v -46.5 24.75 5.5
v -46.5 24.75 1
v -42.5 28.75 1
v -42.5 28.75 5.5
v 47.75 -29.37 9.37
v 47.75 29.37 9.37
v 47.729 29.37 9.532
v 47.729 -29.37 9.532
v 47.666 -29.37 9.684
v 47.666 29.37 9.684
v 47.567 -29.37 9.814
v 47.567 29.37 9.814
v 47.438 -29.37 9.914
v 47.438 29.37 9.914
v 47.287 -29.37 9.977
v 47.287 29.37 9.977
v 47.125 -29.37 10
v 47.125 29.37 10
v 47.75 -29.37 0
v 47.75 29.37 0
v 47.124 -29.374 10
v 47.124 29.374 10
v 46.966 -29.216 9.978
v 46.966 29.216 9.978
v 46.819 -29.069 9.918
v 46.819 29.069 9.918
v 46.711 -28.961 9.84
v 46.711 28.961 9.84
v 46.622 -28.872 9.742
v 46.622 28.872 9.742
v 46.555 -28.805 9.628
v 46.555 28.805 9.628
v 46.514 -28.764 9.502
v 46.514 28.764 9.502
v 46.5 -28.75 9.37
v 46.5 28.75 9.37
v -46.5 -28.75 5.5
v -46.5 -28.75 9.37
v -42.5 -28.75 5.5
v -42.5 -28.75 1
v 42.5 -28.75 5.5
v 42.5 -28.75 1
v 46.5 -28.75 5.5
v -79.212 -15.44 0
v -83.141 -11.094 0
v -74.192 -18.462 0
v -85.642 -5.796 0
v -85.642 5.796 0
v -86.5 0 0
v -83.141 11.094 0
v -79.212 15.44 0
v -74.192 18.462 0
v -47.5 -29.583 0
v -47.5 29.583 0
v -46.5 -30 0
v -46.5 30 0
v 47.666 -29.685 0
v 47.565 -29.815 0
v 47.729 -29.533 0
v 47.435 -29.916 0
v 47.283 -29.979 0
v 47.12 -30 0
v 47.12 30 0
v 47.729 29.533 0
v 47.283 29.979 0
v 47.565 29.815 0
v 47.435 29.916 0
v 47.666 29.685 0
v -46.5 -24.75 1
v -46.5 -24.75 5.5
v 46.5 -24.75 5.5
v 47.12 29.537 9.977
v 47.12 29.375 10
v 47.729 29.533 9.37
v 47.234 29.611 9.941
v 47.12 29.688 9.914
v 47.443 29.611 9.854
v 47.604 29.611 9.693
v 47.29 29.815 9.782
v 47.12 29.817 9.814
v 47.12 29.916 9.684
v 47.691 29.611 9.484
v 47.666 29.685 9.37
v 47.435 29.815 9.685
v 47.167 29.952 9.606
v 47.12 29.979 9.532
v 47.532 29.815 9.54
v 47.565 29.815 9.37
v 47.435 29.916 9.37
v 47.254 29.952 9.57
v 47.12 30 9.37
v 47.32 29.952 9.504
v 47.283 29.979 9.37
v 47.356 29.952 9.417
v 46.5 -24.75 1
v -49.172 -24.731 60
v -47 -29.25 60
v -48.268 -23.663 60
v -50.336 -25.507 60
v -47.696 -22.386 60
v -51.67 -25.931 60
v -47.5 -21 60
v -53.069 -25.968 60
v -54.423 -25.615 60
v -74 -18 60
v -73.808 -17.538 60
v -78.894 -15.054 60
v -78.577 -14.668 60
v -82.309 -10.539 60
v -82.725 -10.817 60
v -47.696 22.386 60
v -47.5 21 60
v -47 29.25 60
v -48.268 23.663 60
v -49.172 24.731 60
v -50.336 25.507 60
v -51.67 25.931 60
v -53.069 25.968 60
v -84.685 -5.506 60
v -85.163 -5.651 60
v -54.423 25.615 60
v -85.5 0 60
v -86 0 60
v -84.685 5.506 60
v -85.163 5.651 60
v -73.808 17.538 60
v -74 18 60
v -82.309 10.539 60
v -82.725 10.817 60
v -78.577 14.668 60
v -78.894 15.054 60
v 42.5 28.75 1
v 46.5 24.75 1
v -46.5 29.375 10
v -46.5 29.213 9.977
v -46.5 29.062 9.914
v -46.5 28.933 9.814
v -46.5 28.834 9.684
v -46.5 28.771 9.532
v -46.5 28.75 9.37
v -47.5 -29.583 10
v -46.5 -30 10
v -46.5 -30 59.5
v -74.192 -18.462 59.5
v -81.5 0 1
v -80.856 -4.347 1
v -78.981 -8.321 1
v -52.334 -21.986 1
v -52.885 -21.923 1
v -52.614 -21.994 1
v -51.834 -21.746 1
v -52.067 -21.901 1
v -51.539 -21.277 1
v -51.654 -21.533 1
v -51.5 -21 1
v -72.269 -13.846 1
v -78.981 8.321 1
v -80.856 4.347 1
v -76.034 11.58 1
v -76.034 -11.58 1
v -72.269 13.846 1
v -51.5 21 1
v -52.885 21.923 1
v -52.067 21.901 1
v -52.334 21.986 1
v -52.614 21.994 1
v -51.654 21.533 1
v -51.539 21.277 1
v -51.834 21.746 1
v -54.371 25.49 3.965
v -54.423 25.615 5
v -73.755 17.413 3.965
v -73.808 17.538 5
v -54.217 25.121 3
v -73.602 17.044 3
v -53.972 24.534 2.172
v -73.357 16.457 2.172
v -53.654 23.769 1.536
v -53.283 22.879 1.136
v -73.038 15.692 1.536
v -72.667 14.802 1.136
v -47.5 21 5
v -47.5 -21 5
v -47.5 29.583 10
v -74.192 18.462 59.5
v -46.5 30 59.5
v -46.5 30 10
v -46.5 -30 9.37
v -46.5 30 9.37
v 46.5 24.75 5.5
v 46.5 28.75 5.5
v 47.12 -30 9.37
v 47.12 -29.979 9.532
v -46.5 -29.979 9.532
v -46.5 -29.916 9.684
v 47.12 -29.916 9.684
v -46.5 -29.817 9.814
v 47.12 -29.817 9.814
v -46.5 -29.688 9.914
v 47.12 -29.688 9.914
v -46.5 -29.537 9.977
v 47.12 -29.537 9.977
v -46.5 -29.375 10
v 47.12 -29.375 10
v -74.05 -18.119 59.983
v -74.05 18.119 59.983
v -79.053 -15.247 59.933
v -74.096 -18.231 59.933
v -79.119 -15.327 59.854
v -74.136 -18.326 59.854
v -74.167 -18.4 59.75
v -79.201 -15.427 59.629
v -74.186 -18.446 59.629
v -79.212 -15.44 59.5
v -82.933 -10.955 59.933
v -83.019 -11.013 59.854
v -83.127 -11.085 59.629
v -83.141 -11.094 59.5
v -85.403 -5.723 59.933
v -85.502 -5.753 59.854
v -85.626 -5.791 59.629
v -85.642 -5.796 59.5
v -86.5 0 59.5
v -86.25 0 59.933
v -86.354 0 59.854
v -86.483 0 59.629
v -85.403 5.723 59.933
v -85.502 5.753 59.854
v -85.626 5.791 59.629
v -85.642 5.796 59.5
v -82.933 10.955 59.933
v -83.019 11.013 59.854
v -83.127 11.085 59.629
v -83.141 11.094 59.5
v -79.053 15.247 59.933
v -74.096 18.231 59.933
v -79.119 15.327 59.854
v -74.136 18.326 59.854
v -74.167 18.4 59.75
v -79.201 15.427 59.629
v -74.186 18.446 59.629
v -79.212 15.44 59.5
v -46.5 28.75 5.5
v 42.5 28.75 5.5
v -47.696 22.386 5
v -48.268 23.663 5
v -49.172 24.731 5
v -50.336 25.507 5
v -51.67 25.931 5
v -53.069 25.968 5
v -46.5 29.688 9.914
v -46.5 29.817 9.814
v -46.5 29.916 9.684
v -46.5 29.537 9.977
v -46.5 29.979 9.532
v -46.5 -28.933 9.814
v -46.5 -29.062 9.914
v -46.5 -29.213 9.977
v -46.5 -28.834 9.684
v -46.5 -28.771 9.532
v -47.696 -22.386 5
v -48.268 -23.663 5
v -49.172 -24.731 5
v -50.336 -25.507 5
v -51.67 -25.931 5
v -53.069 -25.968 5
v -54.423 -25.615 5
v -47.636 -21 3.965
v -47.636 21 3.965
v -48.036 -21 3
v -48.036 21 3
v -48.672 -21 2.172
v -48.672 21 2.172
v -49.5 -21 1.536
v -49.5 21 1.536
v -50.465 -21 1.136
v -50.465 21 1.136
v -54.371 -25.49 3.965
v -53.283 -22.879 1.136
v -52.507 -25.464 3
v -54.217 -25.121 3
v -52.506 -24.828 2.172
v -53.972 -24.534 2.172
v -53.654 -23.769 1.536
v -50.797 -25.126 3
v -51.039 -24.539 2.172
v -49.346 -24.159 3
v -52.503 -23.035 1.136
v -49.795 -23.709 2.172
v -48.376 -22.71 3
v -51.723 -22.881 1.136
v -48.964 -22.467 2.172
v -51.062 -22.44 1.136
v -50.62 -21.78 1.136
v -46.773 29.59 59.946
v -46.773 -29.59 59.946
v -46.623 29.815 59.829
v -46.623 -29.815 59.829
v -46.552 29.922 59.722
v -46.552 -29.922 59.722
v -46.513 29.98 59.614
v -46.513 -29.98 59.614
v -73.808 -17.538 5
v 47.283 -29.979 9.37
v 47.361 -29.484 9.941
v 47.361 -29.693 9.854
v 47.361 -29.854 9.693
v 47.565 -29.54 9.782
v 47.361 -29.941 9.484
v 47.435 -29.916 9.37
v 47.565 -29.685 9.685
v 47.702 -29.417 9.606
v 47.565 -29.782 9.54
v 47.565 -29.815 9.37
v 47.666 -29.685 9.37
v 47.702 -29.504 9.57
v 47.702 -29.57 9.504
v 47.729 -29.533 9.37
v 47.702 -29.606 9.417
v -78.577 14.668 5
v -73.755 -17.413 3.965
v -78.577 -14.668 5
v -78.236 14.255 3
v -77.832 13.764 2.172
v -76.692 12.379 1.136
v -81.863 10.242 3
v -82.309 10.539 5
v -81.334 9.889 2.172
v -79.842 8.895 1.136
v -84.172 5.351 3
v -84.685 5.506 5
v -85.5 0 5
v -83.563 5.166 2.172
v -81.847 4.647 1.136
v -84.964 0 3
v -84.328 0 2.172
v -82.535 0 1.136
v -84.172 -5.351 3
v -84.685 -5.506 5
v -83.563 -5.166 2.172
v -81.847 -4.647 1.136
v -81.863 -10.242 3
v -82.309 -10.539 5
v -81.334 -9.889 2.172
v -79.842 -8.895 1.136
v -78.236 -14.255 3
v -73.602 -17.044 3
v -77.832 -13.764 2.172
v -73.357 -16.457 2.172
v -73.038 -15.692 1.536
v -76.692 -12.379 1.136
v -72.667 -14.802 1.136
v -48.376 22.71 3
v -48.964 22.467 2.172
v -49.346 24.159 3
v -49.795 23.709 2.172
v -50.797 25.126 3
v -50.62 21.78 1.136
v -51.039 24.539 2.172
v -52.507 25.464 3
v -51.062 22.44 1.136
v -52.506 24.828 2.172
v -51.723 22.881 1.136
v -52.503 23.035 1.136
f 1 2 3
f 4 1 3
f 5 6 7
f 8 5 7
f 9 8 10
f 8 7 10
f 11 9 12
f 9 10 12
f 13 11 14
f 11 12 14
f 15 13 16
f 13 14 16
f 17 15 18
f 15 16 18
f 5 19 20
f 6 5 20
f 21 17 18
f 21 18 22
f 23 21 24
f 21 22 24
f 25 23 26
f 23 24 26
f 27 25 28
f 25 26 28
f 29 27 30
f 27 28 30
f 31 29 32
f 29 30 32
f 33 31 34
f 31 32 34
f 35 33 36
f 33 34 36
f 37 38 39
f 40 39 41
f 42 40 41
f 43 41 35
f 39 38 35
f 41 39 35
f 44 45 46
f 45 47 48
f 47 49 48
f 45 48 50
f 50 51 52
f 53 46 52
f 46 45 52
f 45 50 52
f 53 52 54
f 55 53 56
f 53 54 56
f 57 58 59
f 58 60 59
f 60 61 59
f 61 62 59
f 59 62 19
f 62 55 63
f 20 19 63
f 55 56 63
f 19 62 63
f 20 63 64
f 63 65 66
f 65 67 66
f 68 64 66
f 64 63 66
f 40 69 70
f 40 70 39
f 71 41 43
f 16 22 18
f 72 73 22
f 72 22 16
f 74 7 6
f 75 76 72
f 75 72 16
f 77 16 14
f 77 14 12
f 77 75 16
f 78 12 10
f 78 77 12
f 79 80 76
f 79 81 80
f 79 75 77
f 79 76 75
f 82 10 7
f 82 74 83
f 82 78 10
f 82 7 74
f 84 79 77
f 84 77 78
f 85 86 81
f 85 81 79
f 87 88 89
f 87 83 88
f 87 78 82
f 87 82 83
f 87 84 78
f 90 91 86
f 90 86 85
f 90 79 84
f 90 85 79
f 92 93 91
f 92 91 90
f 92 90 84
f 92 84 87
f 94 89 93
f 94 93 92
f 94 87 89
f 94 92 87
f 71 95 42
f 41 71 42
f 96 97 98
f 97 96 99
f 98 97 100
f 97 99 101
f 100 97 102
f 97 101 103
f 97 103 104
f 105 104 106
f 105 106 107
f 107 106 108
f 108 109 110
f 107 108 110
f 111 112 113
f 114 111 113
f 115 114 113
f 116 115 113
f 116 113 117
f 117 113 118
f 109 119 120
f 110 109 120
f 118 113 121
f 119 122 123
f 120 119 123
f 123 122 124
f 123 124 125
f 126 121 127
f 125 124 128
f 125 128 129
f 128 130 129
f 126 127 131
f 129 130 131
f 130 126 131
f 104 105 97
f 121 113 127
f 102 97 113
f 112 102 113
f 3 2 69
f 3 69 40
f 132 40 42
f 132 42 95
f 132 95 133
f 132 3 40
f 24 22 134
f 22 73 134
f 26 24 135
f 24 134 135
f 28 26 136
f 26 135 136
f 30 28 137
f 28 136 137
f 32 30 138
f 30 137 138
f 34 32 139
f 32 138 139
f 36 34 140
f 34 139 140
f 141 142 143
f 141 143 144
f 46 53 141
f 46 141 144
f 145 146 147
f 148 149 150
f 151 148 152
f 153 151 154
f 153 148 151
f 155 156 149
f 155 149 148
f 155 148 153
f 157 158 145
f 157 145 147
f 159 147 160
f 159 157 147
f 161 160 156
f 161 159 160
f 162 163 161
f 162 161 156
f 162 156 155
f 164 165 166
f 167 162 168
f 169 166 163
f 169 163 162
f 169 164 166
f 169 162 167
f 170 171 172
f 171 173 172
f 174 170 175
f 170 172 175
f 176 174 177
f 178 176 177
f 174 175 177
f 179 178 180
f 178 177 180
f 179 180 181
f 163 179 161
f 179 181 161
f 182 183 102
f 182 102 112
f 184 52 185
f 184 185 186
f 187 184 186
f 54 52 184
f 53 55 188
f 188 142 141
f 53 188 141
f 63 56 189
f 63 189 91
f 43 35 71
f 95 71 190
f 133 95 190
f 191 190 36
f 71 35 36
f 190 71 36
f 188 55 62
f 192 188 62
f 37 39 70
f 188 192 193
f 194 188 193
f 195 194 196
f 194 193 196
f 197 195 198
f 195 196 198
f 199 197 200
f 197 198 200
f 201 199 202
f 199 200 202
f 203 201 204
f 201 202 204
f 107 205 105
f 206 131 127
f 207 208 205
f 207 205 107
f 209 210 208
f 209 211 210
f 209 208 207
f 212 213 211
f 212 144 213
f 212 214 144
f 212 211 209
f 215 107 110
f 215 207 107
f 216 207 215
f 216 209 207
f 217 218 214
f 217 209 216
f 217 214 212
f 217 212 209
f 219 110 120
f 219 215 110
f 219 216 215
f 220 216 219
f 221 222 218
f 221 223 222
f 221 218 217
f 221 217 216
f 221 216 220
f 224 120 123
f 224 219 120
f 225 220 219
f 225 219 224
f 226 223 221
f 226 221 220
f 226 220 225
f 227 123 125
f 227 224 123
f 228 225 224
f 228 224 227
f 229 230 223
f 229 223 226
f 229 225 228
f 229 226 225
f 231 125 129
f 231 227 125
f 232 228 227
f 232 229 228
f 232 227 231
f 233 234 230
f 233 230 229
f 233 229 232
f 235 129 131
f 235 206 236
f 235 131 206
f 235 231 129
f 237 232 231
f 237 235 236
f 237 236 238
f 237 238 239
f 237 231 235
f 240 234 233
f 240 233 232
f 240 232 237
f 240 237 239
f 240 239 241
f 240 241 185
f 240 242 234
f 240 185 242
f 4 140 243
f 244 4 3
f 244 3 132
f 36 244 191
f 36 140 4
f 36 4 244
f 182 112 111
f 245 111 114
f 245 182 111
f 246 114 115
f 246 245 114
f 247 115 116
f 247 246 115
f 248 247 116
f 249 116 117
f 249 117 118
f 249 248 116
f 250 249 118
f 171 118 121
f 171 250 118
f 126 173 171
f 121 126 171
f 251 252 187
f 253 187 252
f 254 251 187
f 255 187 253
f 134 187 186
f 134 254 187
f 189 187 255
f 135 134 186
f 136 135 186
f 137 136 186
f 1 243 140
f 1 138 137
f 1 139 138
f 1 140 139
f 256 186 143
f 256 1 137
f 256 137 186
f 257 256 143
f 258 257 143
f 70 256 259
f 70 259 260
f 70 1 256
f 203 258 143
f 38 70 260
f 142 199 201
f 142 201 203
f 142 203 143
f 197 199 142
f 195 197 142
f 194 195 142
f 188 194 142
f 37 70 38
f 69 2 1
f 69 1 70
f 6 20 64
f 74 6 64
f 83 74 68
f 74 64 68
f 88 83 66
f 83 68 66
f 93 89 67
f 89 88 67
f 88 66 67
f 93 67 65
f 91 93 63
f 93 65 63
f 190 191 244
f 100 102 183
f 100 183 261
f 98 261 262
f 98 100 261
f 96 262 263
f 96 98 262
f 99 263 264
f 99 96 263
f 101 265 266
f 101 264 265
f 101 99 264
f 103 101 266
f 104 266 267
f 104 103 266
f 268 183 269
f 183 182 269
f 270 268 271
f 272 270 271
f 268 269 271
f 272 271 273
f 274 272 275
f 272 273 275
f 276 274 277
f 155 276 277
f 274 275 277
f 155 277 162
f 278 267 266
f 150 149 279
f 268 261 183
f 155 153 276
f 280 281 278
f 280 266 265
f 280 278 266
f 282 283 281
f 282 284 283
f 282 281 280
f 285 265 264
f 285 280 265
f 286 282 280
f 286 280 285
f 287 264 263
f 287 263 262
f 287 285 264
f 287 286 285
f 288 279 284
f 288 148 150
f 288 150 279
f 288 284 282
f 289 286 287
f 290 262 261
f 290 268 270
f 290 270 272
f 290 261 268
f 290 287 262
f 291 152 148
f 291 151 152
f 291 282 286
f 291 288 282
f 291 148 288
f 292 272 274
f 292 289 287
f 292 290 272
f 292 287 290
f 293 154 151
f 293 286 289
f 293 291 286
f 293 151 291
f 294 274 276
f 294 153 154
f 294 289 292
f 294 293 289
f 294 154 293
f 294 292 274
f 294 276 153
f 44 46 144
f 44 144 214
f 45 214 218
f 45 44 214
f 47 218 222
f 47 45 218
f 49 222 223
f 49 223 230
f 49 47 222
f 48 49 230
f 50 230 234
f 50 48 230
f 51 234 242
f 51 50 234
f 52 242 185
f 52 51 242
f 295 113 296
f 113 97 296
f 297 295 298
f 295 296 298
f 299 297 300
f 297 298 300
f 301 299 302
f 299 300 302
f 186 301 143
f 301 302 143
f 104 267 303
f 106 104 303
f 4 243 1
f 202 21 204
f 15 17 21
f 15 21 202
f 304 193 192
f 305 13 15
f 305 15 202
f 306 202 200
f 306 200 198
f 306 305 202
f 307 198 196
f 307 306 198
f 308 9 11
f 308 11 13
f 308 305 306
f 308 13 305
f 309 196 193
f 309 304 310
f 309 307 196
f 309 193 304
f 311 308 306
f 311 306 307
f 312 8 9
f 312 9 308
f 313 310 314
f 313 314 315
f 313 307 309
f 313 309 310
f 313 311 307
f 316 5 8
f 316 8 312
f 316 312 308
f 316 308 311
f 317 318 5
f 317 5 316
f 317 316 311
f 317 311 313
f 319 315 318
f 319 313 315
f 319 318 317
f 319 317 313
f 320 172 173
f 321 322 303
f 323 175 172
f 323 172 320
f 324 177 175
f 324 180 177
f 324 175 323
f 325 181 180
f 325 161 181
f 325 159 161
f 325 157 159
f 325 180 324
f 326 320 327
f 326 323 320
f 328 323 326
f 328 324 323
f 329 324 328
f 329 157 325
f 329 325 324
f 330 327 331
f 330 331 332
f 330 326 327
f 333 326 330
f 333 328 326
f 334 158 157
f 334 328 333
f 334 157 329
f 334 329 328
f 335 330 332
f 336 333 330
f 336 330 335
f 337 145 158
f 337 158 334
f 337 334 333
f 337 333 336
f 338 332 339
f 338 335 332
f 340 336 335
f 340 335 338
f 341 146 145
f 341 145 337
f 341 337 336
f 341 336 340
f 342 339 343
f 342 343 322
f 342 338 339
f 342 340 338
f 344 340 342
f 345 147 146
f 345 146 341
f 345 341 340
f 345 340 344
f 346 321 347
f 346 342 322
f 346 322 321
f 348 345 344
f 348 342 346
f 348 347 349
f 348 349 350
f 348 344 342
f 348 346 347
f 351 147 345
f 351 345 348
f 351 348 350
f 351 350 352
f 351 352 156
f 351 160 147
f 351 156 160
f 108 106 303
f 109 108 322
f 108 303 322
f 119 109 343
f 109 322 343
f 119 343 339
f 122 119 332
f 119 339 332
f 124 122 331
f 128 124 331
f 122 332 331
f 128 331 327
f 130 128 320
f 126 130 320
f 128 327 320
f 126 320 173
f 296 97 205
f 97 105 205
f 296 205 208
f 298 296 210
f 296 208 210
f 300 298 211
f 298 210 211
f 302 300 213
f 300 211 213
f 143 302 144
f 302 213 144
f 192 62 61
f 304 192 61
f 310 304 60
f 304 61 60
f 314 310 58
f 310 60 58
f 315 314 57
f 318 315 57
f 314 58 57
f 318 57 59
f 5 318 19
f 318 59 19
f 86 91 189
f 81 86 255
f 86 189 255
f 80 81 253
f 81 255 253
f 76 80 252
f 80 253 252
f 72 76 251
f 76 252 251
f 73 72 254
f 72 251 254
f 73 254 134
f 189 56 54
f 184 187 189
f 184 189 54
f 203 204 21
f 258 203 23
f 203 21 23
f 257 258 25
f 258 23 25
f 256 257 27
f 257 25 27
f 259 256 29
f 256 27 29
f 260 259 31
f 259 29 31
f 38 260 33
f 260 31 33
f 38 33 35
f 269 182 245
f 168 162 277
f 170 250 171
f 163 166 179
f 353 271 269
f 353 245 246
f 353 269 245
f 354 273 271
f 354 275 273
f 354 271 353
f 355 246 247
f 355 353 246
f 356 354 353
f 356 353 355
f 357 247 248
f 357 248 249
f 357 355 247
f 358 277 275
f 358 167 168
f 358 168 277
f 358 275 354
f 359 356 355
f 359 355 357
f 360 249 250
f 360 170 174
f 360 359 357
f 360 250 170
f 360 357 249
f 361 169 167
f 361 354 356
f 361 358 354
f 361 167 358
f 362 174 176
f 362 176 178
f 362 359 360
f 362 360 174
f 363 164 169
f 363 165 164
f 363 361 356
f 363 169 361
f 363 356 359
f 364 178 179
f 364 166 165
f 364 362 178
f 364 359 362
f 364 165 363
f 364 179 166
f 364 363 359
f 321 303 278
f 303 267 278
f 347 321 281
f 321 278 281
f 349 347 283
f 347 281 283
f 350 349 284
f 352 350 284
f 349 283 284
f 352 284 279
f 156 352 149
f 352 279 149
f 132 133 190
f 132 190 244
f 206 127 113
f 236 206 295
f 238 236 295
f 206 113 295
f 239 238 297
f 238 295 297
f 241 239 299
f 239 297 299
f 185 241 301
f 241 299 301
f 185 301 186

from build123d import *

# Parameters (mm, degrees)
SZKIC1_W                    = 95.25
SZKIC1_H                    = 60
DODANIE_WYCI_GNI_CIE1_DEPTH = 10
SZKIC2_W                    = 93
SZKIC2_H                    = 57.5
WYTNIJ_WYCI_GNI_CIE1_DEPTH  = 9
DODANIE_WYCI_GNI_CIE3_DEPTH = 60
WYTNIJ_WYCI_GNI_CIE2_REACH  = 106.318
DODANIE_WYCI_GNI_CIE4_DEPTH = 1
ZAOKR_GLENIE1_R             = 0.63
ZAOKR_GLENIE2_R             = 5
ZAOKR_GLENIE3_R             = 0.5
DODANIE_WYCI_GNI_CIE2_DEPTH = 4.5
ZAOKR_GLENIE4_R             = 4


with BuildPart() as part:
    # Szkic1 → Dodanie-wyciągnięcie1 (new body)
    with BuildSketch(Plane.XY):
        with Locations((0.125, 0)):
            Rectangle(SZKIC1_W, SZKIC1_H)
    extrude(amount=DODANIE_WYCI_GNI_CIE1_DEPTH)

    # Szkic2 → Wytnij-wyciągnięcie1 (cut)
    with BuildSketch(Plane.XY.offset(10)):
        Rectangle(SZKIC2_W, SZKIC2_H)
    extrude(amount=-WYTNIJ_WYCI_GNI_CIE1_DEPTH, mode=Mode.SUBTRACT)

    # Szkic4 → Dodanie-wyciągnięcie3 (add)
    with BuildSketch(Plane.XY):
        with BuildLine():
            Line((-46.5, -30), (-74.192307692, -18.461538462))
            ThreePointArc((-74.192307692, -18.461538462), (-86.5, 0), (-74.192307692, 18.461538462))
            Line((-74.192307692, 18.461538462), (-46.5, 30))
            Line((-46.5, 30), (-46.5, -30))
        make_face()
        with BuildLine():
            Line((-47.5, -28.5), (-73.807692308, -17.538461538))
            ThreePointArc((-73.807692308, -17.538461538), (-85.5, 0), (-73.807692308, 17.538461538))
            Line((-73.807692308, 17.538461538), (-47.5, 28.5))
            Line((-47.5, 28.5), (-47.5, -28.5))
        make_face(mode=Mode.SUBTRACT)
    extrude(amount=DODANIE_WYCI_GNI_CIE3_DEPTH)

    # Szkic6 → Wytnij-wyciągnięcie2 (cut, up to next)
    with BuildSketch(Plane.XY.offset(10), mode=Mode.PRIVATE) as wytnij_wyci_gni_cie2_sk1:
        Polygon((-46.5, -30), (-47.5, -29.583333333), (-47.5, -30), align=None)
    wytnij_wyci_gni_cie2_tool1 = extrude(wytnij_wyci_gni_cie2_sk1.sketch, amount=-WYTNIJ_WYCI_GNI_CIE2_REACH, mode=Mode.PRIVATE) & part.part
    # Szkic6 → Wytnij-wyciągnięcie2 (cut, up to next)
    with BuildSketch(Plane.XY.offset(10), mode=Mode.PRIVATE) as wytnij_wyci_gni_cie2_sk2:
        Polygon((-46.5, 30), (-47.5, 29.583333333), (-47.5, 30), align=None)
    wytnij_wyci_gni_cie2_tool2 = extrude(wytnij_wyci_gni_cie2_sk2.sketch, amount=-WYTNIJ_WYCI_GNI_CIE2_REACH, mode=Mode.PRIVATE) & part.part
    add(wytnij_wyci_gni_cie2_tool1.solids().sort_by_distance((-47.166667, -29.861111, 10))[0], mode=Mode.SUBTRACT)
    add(wytnij_wyci_gni_cie2_tool2.solids().sort_by_distance((-47.166667, 29.861111, 10))[0], mode=Mode.SUBTRACT)

    # Szkic5 → Dodanie-wyciągnięcie4 (add)
    with BuildSketch(Plane(origin=(0, 0, 0), x_dir=(-1, 0, 0), z_dir=(0, 0, -1))):
        with BuildLine():
            Line((73.807692308, -17.538461538), (47.5, -28.5))
            Line((47.5, -28.5), (47.5, 28.5))
            Line((47.5, 28.5), (73.807692308, 17.538461538))
            ThreePointArc((73.807692308, 17.538461538), (85.5, 0), (73.807692308, -17.538461538))
        make_face()
    extrude(amount=-DODANIE_WYCI_GNI_CIE4_DEPTH)

    # Zaokrąglenie1
    # the kernel refuses this fillet: 0.63 mm, written as the material it takes off along each edge
    with BuildSketch(Plane(origin=(47.12, 29.37, 9.37), x_dir=(1, 0, 0), z_dir=(0, 1, 0))) as zaokr_glenie1_piece_1_section:
        Polygon((0, 0), (ZAOKR_GLENIE1_R * 1.02, 0), (ZAOKR_GLENIE1_R * 1.02, -ZAOKR_GLENIE1_R * 1.02), (0, -ZAOKR_GLENIE1_R * 1.02), align=None)
    zaokr_glenie1_piece_1 = extrude(amount=ZAOKR_GLENIE1_R * 1.02, mode=Mode.PRIVATE)
    zaokr_glenie1_piece_1 = zaokr_glenie1_piece_1 - Plane(origin=(47.12, 29.37, 9.37), x_dir=(-0.7071067811865475, 0, -0.7071067811865475), z_dir=(0, 1, 0)) * Sphere(ZAOKR_GLENIE1_R, mode=Mode.PRIVATE)
    add(zaokr_glenie1_piece_1, mode=Mode.SUBTRACT)
    with BuildSketch(Plane(origin=(47.12, -29.37, 9.37), x_dir=(0, 0, 1), z_dir=(1, 0, 0))) as zaokr_glenie1_piece_2_section:
        Polygon((0, 0), (ZAOKR_GLENIE1_R * 1.02, 0), (ZAOKR_GLENIE1_R * 1.02, ZAOKR_GLENIE1_R * 1.02), (0, ZAOKR_GLENIE1_R * 1.02), align=None)
    zaokr_glenie1_piece_2 = extrude(amount=ZAOKR_GLENIE1_R * 1.02, mode=Mode.PRIVATE)
    zaokr_glenie1_piece_2 = zaokr_glenie1_piece_2 - Plane(origin=(47.12, -29.37, 9.37), x_dir=(0, 0.7071067811865475, -0.7071067811865475), z_dir=(1, 0, 0)) * Sphere(ZAOKR_GLENIE1_R, mode=Mode.PRIVATE)
    add(zaokr_glenie1_piece_2, mode=Mode.SUBTRACT)
    with BuildSketch(Plane(origin=(47.75, 30, -1.575), x_dir=(-1, 0, 0), z_dir=(0, 0, 1)), Plane(origin=(47.75, -30, -1.575), x_dir=(0, 1, 0), z_dir=(0, 0, 1))) as zaokr_glenie1_piece_3:
        with BuildLine():
            CenterArc((ZAOKR_GLENIE1_R, ZAOKR_GLENIE1_R), ZAOKR_GLENIE1_R, 180, 90)
            Line((0, ZAOKR_GLENIE1_R), (0, 0))
            Line((0, 0), (ZAOKR_GLENIE1_R, 0))
        make_face()
    extrude(amount=10.945, mode=Mode.SUBTRACT)
    with BuildSketch(Plane(origin=(-46.5, 30, 10), x_dir=(0, 0, -1), z_dir=(1, 0, 0))) as zaokr_glenie1_piece_4:
        with BuildLine():
            CenterArc((ZAOKR_GLENIE1_R, -ZAOKR_GLENIE1_R), ZAOKR_GLENIE1_R, 90, 90)
            Line((0, -ZAOKR_GLENIE1_R), (0, 0))
            Line((0, 0), (ZAOKR_GLENIE1_R, 0))
        make_face()
    extrude(amount=93.62, mode=Mode.SUBTRACT)
    with BuildSketch(Plane(origin=(47.75, 29.37, 10), x_dir=(0, 0, -1), z_dir=(0, -1, 0))) as zaokr_glenie1_piece_5:
        with BuildLine():
            CenterArc((ZAOKR_GLENIE1_R, -ZAOKR_GLENIE1_R), ZAOKR_GLENIE1_R, 90, 90)
            Line((0, -ZAOKR_GLENIE1_R), (0, 0))
            Line((0, 0), (ZAOKR_GLENIE1_R, 0))
        make_face()
    extrude(amount=58.74, mode=Mode.SUBTRACT)
    with BuildSketch(Plane(origin=(47.12, -30, 10), x_dir=(0, 1, 0), z_dir=(-1, 0, 0))) as zaokr_glenie1_piece_6:
        with BuildLine():
            CenterArc((ZAOKR_GLENIE1_R, ZAOKR_GLENIE1_R), ZAOKR_GLENIE1_R, 180, 90)
            Line((0, ZAOKR_GLENIE1_R), (0, 0))
            Line((0, 0), (ZAOKR_GLENIE1_R, 0))
        make_face()
    extrude(amount=93.62, mode=Mode.SUBTRACT)
    with BuildSketch(Plane(origin=(46.5, 28.75, 10), x_dir=(1, 0, 0), z_dir=(0, -1, 0))) as zaokr_glenie1_piece_7:
        with BuildLine():
            CenterArc((ZAOKR_GLENIE1_R, -ZAOKR_GLENIE1_R), ZAOKR_GLENIE1_R, 90, 90)
            Line((0, -ZAOKR_GLENIE1_R), (0, 0))
            Line((0, 0), (ZAOKR_GLENIE1_R, 0))
        make_face()
    extrude(amount=57.5, mode=Mode.SUBTRACT)
    with BuildSketch(Plane(origin=(-46.5, 28.75, 10), x_dir=(0, 1, 0), z_dir=(1, 0, 0)), Plane(origin=(46.5, -28.75, 10), x_dir=(0, -1, 0), z_dir=(-1, 0, 0))) as zaokr_glenie1_piece_8:
        with BuildLine():
            CenterArc((ZAOKR_GLENIE1_R, -ZAOKR_GLENIE1_R), ZAOKR_GLENIE1_R, 90, 90)
            Line((0, -ZAOKR_GLENIE1_R), (0, 0))
            Line((0, 0), (ZAOKR_GLENIE1_R, 0))
        make_face()
    extrude(amount=93, mode=Mode.SUBTRACT)
    with BuildSketch(Plane(origin=(-46.5, 28.75, 10), x_dir=(0, 1, 0), z_dir=(1, 0, 0))) as zaokr_glenie1_piece_9a_section:
        with BuildLine():
            CenterArc((ZAOKR_GLENIE1_R, -ZAOKR_GLENIE1_R), ZAOKR_GLENIE1_R, 90, 90)
            Line((0, -ZAOKR_GLENIE1_R), (0, 0))
            Line((0, 0), (ZAOKR_GLENIE1_R, 0))
        make_face()
    zaokr_glenie1_piece_9a = extrude(amount=94.575, mode=Mode.PRIVATE)
    zaokr_glenie1_piece_9a = split(zaokr_glenie1_piece_9a, bisect_by=Plane(origin=(47.75, 28.75, 10), z_dir=(-1, 0, 0)), keep=Keep.TOP, mode=Mode.PRIVATE)
    zaokr_glenie1_piece_9a = split(zaokr_glenie1_piece_9a, bisect_by=Plane(origin=(46.5, 28.75, 10), z_dir=(1, 0, 0)), keep=Keep.TOP, mode=Mode.PRIVATE)
    with BuildSketch(Plane(origin=(46.5, 30.325, 10), x_dir=(1, 0, 0), z_dir=(0, -1, 0))) as zaokr_glenie1_piece_9b_section:
        with BuildLine():
            CenterArc((ZAOKR_GLENIE1_R, -ZAOKR_GLENIE1_R), ZAOKR_GLENIE1_R, 90, 90)
            Line((0, -ZAOKR_GLENIE1_R), (0, 0))
            Line((0, 0), (ZAOKR_GLENIE1_R, 0))
        make_face()
    zaokr_glenie1_piece_9b = extrude(amount=59.075, mode=Mode.PRIVATE)
    zaokr_glenie1_piece_9b = split(zaokr_glenie1_piece_9b, bisect_by=Plane(origin=(46.5, 30, 10), z_dir=(0, -1, 0)), keep=Keep.TOP, mode=Mode.PRIVATE)
    zaokr_glenie1_piece_9b = split(zaokr_glenie1_piece_9b, bisect_by=Plane(origin=(46.5, 28.75, 10), z_dir=(0, 1, 0)), keep=Keep.TOP, mode=Mode.PRIVATE)
    zaokr_glenie1_piece_9 = zaokr_glenie1_piece_9a & zaokr_glenie1_piece_9b
    add(zaokr_glenie1_piece_9, mode=Mode.SUBTRACT)
    with BuildSketch(Plane(origin=(46.5, 28.75, 10), x_dir=(1, 0, 0), z_dir=(0, -1, 0))) as zaokr_glenie1_piece_10a_section:
        with BuildLine():
            CenterArc((ZAOKR_GLENIE1_R, -ZAOKR_GLENIE1_R), ZAOKR_GLENIE1_R, 90, 90)
            Line((0, -ZAOKR_GLENIE1_R), (0, 0))
            Line((0, 0), (ZAOKR_GLENIE1_R, 0))
        make_face()
    zaokr_glenie1_piece_10a = extrude(amount=59.075, mode=Mode.PRIVATE)
    zaokr_glenie1_piece_10a = split(zaokr_glenie1_piece_10a, bisect_by=Plane(origin=(46.5, -30, 10), z_dir=(0, 1, 0)), keep=Keep.TOP, mode=Mode.PRIVATE)
    zaokr_glenie1_piece_10a = split(zaokr_glenie1_piece_10a, bisect_by=Plane(origin=(46.5, -28.75, 10), z_dir=(0, -1, 0)), keep=Keep.TOP, mode=Mode.PRIVATE)
    with BuildSketch(Plane(origin=(48.075, -28.75, 10), x_dir=(0, -1, 0), z_dir=(-1, 0, 0))) as zaokr_glenie1_piece_10b_section:
        with BuildLine():
            CenterArc((ZAOKR_GLENIE1_R, -ZAOKR_GLENIE1_R), ZAOKR_GLENIE1_R, 90, 90)
            Line((0, -ZAOKR_GLENIE1_R), (0, 0))
            Line((0, 0), (ZAOKR_GLENIE1_R, 0))
        make_face()
    zaokr_glenie1_piece_10b = extrude(amount=94.575, mode=Mode.PRIVATE)
    zaokr_glenie1_piece_10b = split(zaokr_glenie1_piece_10b, bisect_by=Plane(origin=(47.75, -28.75, 10), z_dir=(-1, 0, 0)), keep=Keep.TOP, mode=Mode.PRIVATE)
    zaokr_glenie1_piece_10b = split(zaokr_glenie1_piece_10b, bisect_by=Plane(origin=(46.5, -28.75, 10), z_dir=(1, 0, 0)), keep=Keep.TOP, mode=Mode.PRIVATE)
    zaokr_glenie1_piece_10 = zaokr_glenie1_piece_10a & zaokr_glenie1_piece_10b
    add(zaokr_glenie1_piece_10, mode=Mode.SUBTRACT)

    # Zaokrąglenie2
    zaokr_glenie2_edges = [part.edges().sort_by_distance(p)[0] for p in [
        (-47.5, 28.5, 30.5),
        (-47.5, -28.5, 30.5),
    ]]
    fillet(zaokr_glenie2_edges, radius=ZAOKR_GLENIE2_R)

    # Zaokrąglenie3
    zaokr_glenie3_edges = [part.edges().sort_by_distance(p)[0] for p in [
        (-86.5, 0, 60),
        (-60.346153846, -24.230769231, 60),
        (-46.5, 0, 60),
        (-60.346153846, 24.230769231, 60),
    ]]
    fillet(zaokr_glenie3_edges, radius=ZAOKR_GLENIE3_R)

    # Szkic3 → Dodanie-wyciągnięcie2 (add)
    with BuildSketch(Plane.XY.offset(1)):
        Polygon((46.5, -28.75), (46.5, -24.75), (42.5, -28.75), align=None)
        Polygon((-42.5, -28.75), (-46.5, -28.75), (-46.5, -24.75), align=None)
        Polygon((-46.5, 28.75), (-46.5, 24.75), (-42.5, 28.75), align=None)
        Polygon((42.5, 28.75), (46.5, 28.75), (46.5, 24.75), align=None)
    extrude(amount=DODANIE_WYCI_GNI_CIE2_DEPTH)

    # Zaokrąglenie4
    zaokr_glenie4_edges = [part.edges().sort_by_distance(p)[0] for p in [
        (-47.5, 0, 1),
        (-64.115384615, -21.576923077, 1),
        (-49.726499019, -25.160251472, 1),
        (-49.726499019, 25.160251472, 1),
        (-85.5, 0, 1),
        (-64.115384615, 21.576923077, 1),
    ]]
    fillet(zaokr_glenie4_edges, radius=ZAOKR_GLENIE4_R)


solid = part.part
